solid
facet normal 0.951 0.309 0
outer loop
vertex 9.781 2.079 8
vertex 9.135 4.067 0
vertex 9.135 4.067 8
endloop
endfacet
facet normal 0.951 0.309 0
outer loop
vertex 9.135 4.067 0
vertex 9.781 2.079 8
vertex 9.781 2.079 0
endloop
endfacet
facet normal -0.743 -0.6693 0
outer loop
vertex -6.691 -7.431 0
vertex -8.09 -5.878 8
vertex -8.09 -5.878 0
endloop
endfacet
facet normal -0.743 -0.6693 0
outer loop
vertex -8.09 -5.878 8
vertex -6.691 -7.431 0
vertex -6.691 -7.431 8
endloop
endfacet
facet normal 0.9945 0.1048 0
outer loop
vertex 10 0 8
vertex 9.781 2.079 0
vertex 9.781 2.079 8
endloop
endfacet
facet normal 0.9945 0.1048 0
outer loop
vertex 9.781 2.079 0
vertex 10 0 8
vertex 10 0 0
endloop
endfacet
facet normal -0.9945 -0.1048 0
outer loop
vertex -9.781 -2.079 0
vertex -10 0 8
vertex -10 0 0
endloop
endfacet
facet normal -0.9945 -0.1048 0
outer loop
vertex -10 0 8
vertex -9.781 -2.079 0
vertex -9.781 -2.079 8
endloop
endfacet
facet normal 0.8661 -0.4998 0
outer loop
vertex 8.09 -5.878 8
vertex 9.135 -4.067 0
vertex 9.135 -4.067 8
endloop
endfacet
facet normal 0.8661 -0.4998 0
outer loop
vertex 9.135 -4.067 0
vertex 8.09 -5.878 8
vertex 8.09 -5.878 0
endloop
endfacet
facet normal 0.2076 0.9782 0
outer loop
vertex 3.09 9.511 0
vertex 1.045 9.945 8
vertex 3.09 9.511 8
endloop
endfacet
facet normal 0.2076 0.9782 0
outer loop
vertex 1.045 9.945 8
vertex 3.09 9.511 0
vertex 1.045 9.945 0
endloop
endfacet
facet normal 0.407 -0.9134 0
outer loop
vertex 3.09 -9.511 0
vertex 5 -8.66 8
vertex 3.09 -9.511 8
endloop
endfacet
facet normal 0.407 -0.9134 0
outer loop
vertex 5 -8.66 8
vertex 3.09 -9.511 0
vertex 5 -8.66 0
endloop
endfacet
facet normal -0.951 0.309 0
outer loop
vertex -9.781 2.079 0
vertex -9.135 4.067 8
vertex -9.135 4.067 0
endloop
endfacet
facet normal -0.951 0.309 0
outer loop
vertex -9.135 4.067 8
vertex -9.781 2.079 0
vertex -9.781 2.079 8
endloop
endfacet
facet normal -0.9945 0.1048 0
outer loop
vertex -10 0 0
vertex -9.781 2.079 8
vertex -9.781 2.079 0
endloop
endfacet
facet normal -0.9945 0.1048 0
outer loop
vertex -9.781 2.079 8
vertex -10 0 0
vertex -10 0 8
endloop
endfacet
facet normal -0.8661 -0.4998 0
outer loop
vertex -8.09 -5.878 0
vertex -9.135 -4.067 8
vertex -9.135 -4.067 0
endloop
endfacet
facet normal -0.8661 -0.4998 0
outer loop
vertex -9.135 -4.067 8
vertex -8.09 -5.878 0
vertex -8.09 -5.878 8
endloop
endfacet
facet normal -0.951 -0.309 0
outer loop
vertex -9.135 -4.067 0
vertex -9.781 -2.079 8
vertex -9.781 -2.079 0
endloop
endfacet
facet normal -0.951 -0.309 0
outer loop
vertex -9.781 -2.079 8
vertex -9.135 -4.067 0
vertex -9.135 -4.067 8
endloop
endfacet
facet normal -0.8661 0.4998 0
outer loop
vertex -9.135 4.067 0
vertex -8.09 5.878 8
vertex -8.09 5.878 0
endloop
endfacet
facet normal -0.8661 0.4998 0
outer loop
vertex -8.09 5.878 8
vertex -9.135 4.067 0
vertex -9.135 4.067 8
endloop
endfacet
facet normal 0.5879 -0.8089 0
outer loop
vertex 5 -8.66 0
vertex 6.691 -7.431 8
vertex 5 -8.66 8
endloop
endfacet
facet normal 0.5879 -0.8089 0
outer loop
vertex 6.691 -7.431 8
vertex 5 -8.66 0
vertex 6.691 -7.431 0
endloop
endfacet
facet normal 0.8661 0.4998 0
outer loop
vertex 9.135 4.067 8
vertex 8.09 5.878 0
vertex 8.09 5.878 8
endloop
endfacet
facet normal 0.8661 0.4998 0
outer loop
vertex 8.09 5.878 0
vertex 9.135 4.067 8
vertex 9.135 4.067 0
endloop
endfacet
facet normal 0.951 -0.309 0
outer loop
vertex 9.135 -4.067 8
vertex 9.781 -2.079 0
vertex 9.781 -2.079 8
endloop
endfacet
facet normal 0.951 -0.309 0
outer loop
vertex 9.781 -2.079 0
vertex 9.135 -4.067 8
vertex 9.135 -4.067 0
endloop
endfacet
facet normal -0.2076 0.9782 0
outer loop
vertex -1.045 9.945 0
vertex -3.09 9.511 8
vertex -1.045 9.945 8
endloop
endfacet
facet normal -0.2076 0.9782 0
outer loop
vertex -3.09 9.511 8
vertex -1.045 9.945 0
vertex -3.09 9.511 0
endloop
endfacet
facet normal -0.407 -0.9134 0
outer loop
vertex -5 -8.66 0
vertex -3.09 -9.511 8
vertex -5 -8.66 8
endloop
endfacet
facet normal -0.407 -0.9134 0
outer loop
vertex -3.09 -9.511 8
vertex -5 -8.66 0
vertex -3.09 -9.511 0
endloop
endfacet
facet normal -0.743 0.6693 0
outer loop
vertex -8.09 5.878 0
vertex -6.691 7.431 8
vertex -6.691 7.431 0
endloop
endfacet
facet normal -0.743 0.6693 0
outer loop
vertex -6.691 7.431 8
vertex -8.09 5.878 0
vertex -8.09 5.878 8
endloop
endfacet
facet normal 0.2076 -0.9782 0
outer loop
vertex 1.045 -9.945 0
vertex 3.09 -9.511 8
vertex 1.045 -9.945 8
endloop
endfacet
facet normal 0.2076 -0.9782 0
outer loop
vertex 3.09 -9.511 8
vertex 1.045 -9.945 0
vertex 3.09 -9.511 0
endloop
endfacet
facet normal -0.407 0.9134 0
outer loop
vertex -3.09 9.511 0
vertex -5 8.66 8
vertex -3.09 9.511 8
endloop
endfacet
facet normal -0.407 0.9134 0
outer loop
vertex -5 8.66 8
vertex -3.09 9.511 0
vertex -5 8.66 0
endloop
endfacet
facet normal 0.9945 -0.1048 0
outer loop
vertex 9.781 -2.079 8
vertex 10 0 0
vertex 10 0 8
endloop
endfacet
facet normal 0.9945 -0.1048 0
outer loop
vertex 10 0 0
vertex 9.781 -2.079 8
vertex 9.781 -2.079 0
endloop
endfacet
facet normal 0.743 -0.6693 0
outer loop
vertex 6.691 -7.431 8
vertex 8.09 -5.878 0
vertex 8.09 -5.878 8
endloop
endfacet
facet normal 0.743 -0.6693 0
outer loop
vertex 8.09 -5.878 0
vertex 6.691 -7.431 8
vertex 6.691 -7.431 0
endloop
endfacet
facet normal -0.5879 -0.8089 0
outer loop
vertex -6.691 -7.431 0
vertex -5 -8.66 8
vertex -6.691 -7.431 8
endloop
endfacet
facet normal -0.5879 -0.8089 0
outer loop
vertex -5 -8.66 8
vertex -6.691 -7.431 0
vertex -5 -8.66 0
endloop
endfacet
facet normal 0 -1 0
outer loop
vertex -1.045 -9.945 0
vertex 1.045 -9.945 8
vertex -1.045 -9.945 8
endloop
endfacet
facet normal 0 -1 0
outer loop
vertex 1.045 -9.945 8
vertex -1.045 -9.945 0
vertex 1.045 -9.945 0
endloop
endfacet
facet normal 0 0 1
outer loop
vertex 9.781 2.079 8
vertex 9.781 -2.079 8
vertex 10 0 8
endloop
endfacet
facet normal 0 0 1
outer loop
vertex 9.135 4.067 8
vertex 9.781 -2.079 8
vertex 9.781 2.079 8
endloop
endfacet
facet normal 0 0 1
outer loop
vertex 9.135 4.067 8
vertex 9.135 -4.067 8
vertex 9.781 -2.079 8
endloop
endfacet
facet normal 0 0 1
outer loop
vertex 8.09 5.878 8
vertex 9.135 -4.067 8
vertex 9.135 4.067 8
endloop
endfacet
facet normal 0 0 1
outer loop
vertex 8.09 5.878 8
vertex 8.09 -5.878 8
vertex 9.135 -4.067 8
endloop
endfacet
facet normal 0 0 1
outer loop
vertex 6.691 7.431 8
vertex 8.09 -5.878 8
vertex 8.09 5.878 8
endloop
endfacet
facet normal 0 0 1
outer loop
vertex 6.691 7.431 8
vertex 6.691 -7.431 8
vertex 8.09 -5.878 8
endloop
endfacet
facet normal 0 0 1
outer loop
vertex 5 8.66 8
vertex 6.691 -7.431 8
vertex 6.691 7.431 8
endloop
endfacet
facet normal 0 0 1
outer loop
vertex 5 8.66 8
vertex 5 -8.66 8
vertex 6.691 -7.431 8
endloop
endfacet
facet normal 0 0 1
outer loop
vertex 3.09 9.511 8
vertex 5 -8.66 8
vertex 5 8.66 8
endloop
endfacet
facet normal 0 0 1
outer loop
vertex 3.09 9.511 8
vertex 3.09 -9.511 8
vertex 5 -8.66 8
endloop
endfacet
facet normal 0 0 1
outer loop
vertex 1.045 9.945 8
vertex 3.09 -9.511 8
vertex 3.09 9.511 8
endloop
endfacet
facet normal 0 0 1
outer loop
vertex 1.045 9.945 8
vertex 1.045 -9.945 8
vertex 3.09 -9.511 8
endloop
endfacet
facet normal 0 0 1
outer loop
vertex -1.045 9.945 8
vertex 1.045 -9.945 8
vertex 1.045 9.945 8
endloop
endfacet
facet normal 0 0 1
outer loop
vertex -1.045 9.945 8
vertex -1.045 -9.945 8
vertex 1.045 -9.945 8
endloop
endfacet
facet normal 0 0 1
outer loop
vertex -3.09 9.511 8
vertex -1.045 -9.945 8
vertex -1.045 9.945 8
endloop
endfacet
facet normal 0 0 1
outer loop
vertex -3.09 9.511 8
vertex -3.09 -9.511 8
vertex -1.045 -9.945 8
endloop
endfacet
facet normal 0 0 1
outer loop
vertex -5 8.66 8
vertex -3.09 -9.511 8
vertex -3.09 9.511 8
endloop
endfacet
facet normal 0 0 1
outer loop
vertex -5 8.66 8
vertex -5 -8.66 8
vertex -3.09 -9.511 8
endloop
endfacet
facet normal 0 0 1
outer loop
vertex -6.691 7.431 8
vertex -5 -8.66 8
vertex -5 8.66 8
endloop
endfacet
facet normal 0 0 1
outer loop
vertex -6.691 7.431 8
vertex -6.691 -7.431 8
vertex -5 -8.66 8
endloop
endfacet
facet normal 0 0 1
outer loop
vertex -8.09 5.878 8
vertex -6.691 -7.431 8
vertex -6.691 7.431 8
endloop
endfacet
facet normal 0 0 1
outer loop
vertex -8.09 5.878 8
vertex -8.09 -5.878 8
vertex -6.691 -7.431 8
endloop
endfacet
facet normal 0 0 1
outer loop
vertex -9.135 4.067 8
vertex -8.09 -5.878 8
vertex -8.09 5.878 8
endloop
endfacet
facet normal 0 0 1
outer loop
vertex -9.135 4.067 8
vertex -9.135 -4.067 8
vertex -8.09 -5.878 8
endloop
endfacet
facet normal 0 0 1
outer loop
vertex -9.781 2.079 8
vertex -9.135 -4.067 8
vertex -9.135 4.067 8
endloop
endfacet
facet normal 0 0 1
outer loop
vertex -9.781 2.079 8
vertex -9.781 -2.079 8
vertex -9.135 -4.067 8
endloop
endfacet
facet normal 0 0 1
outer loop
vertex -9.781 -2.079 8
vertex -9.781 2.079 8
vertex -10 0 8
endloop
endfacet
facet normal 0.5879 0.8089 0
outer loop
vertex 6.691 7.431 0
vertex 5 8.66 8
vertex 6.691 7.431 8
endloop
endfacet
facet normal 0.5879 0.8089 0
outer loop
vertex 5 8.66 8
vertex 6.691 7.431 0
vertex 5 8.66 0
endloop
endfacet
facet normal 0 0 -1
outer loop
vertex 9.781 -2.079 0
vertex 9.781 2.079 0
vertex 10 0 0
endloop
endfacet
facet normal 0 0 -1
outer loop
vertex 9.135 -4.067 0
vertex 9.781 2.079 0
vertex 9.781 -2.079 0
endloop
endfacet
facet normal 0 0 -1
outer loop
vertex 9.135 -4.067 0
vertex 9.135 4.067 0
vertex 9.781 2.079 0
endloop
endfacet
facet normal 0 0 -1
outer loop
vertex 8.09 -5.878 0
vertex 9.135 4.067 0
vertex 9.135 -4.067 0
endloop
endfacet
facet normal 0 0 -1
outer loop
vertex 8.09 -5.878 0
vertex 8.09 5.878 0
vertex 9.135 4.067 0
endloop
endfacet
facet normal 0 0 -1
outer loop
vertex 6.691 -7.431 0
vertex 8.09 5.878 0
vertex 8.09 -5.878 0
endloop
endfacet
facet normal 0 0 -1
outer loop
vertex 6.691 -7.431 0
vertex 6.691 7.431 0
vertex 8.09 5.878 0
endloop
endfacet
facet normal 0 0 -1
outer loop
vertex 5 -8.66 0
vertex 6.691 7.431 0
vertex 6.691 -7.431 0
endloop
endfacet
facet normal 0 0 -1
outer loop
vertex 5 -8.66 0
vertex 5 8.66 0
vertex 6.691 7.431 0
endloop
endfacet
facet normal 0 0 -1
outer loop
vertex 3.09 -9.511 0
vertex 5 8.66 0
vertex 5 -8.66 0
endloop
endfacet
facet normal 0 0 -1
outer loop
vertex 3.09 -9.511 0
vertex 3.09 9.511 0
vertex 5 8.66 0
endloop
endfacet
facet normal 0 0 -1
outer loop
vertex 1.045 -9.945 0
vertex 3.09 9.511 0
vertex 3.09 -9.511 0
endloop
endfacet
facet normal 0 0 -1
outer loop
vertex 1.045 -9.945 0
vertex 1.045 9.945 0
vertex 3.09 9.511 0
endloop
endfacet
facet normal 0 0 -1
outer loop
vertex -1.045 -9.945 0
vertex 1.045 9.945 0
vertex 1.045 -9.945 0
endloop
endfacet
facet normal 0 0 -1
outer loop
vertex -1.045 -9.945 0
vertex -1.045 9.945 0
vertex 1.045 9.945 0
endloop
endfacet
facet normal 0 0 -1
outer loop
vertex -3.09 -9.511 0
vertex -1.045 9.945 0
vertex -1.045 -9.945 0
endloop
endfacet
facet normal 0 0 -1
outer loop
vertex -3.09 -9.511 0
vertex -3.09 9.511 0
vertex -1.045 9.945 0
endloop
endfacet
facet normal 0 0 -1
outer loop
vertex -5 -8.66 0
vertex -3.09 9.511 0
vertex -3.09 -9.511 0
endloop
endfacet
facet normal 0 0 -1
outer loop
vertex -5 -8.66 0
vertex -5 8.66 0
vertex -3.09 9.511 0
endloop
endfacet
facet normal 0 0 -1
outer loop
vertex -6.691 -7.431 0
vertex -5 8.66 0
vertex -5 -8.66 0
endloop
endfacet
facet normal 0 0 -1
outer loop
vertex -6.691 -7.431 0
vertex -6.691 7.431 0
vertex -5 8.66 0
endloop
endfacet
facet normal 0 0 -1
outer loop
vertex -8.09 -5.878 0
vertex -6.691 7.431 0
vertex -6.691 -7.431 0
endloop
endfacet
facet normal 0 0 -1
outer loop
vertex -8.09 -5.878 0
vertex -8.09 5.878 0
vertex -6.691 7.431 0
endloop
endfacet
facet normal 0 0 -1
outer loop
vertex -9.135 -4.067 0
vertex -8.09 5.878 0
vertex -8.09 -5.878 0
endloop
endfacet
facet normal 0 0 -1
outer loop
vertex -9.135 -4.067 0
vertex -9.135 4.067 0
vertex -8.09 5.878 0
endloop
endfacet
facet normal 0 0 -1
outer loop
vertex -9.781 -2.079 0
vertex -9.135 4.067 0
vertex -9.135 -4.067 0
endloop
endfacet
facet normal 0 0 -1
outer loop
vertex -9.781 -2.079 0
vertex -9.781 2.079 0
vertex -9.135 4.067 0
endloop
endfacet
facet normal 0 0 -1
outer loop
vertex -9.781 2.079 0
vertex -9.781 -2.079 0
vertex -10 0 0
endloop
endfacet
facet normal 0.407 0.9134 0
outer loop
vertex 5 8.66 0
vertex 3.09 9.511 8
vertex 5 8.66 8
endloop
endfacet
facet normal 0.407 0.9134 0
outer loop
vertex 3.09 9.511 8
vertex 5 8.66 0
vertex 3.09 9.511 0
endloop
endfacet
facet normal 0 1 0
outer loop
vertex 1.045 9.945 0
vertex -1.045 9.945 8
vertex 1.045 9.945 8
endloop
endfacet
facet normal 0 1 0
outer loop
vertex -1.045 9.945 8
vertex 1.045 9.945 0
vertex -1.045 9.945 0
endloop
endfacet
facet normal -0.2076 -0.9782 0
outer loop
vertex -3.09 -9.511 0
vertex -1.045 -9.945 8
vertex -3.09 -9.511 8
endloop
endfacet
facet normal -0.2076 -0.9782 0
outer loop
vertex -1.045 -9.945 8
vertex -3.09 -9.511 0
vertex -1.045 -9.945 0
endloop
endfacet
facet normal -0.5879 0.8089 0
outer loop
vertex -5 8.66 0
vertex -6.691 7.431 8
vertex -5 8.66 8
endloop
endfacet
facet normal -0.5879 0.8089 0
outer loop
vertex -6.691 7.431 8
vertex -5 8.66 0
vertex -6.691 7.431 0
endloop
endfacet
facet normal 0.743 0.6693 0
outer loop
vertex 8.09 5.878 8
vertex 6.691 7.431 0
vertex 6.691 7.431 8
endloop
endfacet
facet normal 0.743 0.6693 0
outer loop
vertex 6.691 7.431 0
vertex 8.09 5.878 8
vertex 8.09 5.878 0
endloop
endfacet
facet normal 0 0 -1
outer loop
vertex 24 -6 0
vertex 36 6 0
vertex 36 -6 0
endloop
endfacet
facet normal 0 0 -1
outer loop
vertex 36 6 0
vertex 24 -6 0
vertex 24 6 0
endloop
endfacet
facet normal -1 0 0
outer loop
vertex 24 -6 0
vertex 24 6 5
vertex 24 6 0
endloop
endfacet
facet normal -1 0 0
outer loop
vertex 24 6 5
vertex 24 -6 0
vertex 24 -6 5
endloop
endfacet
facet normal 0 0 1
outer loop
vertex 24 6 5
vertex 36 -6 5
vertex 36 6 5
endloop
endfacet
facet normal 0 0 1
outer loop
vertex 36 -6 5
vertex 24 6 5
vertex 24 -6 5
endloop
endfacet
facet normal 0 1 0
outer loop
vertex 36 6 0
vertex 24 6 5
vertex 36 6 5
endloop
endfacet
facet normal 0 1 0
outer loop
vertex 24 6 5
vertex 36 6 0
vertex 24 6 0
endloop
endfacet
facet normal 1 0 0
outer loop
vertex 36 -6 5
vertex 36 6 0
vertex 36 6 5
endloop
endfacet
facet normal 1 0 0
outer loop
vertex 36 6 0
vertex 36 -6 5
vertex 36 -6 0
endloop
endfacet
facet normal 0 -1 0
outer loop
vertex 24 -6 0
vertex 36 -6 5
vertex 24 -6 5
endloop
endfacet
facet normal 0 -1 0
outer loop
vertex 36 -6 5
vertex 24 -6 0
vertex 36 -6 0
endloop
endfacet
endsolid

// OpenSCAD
// linear_extrude from 2D
linear_extrude(height = 8)
    circle(r = 10);

translate([30, 0, 0])
linear_extrude(height = 5)
    square(12, center = true);
